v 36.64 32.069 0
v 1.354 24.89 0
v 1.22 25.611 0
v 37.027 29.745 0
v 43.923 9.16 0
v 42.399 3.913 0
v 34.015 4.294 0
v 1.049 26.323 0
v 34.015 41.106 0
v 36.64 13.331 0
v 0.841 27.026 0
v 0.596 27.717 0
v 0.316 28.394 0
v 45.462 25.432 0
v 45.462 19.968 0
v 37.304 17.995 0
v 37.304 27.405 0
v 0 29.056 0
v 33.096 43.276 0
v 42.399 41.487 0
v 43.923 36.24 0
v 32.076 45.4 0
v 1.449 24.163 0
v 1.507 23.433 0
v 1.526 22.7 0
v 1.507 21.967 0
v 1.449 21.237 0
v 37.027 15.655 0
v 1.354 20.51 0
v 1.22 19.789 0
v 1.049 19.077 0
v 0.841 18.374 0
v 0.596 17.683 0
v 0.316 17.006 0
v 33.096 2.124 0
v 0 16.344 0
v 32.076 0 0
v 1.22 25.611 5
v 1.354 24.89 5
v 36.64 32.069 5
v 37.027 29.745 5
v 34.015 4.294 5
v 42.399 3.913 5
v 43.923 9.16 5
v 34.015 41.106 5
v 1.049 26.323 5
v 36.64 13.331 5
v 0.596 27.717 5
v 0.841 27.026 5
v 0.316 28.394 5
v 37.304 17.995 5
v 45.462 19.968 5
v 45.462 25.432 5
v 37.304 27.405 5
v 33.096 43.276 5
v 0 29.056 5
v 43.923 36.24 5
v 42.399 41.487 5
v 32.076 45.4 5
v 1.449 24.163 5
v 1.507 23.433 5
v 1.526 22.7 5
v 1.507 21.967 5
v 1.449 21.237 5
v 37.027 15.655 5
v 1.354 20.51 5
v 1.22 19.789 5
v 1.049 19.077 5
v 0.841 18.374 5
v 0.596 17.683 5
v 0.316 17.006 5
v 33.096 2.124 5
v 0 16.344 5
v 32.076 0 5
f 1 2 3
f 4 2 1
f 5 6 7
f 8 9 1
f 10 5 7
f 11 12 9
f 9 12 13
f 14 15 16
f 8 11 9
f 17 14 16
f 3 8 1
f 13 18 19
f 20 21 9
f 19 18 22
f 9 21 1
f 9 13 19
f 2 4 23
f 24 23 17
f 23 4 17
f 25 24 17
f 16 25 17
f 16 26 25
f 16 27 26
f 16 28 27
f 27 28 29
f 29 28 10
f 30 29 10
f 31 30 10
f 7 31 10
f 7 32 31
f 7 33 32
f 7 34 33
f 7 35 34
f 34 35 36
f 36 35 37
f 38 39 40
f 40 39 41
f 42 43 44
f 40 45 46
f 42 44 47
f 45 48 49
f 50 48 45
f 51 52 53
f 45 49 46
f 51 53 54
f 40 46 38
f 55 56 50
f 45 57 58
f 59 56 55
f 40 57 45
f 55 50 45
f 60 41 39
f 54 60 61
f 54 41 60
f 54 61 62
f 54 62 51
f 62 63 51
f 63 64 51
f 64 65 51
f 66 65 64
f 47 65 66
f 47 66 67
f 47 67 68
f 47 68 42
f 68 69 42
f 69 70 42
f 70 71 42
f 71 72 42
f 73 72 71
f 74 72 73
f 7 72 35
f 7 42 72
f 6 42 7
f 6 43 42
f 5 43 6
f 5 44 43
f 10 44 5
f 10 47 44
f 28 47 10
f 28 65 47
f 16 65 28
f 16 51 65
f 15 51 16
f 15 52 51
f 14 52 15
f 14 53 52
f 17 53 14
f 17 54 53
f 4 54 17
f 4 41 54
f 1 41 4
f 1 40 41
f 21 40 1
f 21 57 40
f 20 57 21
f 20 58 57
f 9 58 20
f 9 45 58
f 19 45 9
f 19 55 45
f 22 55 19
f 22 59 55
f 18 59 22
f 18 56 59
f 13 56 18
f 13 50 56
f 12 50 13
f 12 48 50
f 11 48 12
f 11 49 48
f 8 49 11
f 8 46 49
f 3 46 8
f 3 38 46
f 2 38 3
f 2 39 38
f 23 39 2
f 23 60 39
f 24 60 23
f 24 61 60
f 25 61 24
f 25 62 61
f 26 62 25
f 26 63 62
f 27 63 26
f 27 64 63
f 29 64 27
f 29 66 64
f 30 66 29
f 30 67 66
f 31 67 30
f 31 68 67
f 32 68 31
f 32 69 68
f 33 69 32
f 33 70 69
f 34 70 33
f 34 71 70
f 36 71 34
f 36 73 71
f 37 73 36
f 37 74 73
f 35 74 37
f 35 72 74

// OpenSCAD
$fn = 32;

// ----------------------------------------------------------------------
// Gear sector: 3 teeth on 54 degrees
// ----------------------------------------------------------------------

// --- parameters (mm) ---
sector_angle = 54;        // sector angle, degrees
root_r = 50;              // root circle radius
tooth_h = 8;              // tooth height over the root circle
teeth = 3;                // number of teeth on the sector
hub_r = 14;               // hub bore radius
plate_t = 5;              // sector thickness, Z
arc_step = 3;             // sampling step of the root/hub arcs, degrees

tip_r = root_r + tooth_h;  // tip circle radius

profile = [[32.076, 0], [33.096, 2.124], [34.015, 4.294], [42.399, 3.913], [43.923, 9.16], [36.64, 13.331], [37.027, 15.655], [37.304, 17.995], [45.462, 19.968], [45.462, 25.432], [37.304, 27.405], [37.027, 29.745], [36.64, 32.069], [43.923, 36.24], [42.399, 41.487], [34.015, 41.106], [33.096, 43.276], [32.076, 45.4], [0, 29.056], [0.316, 28.394], [0.596, 27.717], [0.841, 27.026], [1.049, 26.323], [1.22, 25.611], [1.354, 24.89], [1.449, 24.163], [1.507, 23.433], [1.526, 22.7], [1.507, 21.967], [1.449, 21.237], [1.354, 20.51], [1.22, 19.789], [1.049, 19.077], [0.841, 18.374], [0.596, 17.683], [0.316, 17.006], [0, 16.344]];  // primary outline, 37 points, counter clockwise

// --- the one profile operation ---
linear_extrude(height = plate_t) polygon(points = profile);
